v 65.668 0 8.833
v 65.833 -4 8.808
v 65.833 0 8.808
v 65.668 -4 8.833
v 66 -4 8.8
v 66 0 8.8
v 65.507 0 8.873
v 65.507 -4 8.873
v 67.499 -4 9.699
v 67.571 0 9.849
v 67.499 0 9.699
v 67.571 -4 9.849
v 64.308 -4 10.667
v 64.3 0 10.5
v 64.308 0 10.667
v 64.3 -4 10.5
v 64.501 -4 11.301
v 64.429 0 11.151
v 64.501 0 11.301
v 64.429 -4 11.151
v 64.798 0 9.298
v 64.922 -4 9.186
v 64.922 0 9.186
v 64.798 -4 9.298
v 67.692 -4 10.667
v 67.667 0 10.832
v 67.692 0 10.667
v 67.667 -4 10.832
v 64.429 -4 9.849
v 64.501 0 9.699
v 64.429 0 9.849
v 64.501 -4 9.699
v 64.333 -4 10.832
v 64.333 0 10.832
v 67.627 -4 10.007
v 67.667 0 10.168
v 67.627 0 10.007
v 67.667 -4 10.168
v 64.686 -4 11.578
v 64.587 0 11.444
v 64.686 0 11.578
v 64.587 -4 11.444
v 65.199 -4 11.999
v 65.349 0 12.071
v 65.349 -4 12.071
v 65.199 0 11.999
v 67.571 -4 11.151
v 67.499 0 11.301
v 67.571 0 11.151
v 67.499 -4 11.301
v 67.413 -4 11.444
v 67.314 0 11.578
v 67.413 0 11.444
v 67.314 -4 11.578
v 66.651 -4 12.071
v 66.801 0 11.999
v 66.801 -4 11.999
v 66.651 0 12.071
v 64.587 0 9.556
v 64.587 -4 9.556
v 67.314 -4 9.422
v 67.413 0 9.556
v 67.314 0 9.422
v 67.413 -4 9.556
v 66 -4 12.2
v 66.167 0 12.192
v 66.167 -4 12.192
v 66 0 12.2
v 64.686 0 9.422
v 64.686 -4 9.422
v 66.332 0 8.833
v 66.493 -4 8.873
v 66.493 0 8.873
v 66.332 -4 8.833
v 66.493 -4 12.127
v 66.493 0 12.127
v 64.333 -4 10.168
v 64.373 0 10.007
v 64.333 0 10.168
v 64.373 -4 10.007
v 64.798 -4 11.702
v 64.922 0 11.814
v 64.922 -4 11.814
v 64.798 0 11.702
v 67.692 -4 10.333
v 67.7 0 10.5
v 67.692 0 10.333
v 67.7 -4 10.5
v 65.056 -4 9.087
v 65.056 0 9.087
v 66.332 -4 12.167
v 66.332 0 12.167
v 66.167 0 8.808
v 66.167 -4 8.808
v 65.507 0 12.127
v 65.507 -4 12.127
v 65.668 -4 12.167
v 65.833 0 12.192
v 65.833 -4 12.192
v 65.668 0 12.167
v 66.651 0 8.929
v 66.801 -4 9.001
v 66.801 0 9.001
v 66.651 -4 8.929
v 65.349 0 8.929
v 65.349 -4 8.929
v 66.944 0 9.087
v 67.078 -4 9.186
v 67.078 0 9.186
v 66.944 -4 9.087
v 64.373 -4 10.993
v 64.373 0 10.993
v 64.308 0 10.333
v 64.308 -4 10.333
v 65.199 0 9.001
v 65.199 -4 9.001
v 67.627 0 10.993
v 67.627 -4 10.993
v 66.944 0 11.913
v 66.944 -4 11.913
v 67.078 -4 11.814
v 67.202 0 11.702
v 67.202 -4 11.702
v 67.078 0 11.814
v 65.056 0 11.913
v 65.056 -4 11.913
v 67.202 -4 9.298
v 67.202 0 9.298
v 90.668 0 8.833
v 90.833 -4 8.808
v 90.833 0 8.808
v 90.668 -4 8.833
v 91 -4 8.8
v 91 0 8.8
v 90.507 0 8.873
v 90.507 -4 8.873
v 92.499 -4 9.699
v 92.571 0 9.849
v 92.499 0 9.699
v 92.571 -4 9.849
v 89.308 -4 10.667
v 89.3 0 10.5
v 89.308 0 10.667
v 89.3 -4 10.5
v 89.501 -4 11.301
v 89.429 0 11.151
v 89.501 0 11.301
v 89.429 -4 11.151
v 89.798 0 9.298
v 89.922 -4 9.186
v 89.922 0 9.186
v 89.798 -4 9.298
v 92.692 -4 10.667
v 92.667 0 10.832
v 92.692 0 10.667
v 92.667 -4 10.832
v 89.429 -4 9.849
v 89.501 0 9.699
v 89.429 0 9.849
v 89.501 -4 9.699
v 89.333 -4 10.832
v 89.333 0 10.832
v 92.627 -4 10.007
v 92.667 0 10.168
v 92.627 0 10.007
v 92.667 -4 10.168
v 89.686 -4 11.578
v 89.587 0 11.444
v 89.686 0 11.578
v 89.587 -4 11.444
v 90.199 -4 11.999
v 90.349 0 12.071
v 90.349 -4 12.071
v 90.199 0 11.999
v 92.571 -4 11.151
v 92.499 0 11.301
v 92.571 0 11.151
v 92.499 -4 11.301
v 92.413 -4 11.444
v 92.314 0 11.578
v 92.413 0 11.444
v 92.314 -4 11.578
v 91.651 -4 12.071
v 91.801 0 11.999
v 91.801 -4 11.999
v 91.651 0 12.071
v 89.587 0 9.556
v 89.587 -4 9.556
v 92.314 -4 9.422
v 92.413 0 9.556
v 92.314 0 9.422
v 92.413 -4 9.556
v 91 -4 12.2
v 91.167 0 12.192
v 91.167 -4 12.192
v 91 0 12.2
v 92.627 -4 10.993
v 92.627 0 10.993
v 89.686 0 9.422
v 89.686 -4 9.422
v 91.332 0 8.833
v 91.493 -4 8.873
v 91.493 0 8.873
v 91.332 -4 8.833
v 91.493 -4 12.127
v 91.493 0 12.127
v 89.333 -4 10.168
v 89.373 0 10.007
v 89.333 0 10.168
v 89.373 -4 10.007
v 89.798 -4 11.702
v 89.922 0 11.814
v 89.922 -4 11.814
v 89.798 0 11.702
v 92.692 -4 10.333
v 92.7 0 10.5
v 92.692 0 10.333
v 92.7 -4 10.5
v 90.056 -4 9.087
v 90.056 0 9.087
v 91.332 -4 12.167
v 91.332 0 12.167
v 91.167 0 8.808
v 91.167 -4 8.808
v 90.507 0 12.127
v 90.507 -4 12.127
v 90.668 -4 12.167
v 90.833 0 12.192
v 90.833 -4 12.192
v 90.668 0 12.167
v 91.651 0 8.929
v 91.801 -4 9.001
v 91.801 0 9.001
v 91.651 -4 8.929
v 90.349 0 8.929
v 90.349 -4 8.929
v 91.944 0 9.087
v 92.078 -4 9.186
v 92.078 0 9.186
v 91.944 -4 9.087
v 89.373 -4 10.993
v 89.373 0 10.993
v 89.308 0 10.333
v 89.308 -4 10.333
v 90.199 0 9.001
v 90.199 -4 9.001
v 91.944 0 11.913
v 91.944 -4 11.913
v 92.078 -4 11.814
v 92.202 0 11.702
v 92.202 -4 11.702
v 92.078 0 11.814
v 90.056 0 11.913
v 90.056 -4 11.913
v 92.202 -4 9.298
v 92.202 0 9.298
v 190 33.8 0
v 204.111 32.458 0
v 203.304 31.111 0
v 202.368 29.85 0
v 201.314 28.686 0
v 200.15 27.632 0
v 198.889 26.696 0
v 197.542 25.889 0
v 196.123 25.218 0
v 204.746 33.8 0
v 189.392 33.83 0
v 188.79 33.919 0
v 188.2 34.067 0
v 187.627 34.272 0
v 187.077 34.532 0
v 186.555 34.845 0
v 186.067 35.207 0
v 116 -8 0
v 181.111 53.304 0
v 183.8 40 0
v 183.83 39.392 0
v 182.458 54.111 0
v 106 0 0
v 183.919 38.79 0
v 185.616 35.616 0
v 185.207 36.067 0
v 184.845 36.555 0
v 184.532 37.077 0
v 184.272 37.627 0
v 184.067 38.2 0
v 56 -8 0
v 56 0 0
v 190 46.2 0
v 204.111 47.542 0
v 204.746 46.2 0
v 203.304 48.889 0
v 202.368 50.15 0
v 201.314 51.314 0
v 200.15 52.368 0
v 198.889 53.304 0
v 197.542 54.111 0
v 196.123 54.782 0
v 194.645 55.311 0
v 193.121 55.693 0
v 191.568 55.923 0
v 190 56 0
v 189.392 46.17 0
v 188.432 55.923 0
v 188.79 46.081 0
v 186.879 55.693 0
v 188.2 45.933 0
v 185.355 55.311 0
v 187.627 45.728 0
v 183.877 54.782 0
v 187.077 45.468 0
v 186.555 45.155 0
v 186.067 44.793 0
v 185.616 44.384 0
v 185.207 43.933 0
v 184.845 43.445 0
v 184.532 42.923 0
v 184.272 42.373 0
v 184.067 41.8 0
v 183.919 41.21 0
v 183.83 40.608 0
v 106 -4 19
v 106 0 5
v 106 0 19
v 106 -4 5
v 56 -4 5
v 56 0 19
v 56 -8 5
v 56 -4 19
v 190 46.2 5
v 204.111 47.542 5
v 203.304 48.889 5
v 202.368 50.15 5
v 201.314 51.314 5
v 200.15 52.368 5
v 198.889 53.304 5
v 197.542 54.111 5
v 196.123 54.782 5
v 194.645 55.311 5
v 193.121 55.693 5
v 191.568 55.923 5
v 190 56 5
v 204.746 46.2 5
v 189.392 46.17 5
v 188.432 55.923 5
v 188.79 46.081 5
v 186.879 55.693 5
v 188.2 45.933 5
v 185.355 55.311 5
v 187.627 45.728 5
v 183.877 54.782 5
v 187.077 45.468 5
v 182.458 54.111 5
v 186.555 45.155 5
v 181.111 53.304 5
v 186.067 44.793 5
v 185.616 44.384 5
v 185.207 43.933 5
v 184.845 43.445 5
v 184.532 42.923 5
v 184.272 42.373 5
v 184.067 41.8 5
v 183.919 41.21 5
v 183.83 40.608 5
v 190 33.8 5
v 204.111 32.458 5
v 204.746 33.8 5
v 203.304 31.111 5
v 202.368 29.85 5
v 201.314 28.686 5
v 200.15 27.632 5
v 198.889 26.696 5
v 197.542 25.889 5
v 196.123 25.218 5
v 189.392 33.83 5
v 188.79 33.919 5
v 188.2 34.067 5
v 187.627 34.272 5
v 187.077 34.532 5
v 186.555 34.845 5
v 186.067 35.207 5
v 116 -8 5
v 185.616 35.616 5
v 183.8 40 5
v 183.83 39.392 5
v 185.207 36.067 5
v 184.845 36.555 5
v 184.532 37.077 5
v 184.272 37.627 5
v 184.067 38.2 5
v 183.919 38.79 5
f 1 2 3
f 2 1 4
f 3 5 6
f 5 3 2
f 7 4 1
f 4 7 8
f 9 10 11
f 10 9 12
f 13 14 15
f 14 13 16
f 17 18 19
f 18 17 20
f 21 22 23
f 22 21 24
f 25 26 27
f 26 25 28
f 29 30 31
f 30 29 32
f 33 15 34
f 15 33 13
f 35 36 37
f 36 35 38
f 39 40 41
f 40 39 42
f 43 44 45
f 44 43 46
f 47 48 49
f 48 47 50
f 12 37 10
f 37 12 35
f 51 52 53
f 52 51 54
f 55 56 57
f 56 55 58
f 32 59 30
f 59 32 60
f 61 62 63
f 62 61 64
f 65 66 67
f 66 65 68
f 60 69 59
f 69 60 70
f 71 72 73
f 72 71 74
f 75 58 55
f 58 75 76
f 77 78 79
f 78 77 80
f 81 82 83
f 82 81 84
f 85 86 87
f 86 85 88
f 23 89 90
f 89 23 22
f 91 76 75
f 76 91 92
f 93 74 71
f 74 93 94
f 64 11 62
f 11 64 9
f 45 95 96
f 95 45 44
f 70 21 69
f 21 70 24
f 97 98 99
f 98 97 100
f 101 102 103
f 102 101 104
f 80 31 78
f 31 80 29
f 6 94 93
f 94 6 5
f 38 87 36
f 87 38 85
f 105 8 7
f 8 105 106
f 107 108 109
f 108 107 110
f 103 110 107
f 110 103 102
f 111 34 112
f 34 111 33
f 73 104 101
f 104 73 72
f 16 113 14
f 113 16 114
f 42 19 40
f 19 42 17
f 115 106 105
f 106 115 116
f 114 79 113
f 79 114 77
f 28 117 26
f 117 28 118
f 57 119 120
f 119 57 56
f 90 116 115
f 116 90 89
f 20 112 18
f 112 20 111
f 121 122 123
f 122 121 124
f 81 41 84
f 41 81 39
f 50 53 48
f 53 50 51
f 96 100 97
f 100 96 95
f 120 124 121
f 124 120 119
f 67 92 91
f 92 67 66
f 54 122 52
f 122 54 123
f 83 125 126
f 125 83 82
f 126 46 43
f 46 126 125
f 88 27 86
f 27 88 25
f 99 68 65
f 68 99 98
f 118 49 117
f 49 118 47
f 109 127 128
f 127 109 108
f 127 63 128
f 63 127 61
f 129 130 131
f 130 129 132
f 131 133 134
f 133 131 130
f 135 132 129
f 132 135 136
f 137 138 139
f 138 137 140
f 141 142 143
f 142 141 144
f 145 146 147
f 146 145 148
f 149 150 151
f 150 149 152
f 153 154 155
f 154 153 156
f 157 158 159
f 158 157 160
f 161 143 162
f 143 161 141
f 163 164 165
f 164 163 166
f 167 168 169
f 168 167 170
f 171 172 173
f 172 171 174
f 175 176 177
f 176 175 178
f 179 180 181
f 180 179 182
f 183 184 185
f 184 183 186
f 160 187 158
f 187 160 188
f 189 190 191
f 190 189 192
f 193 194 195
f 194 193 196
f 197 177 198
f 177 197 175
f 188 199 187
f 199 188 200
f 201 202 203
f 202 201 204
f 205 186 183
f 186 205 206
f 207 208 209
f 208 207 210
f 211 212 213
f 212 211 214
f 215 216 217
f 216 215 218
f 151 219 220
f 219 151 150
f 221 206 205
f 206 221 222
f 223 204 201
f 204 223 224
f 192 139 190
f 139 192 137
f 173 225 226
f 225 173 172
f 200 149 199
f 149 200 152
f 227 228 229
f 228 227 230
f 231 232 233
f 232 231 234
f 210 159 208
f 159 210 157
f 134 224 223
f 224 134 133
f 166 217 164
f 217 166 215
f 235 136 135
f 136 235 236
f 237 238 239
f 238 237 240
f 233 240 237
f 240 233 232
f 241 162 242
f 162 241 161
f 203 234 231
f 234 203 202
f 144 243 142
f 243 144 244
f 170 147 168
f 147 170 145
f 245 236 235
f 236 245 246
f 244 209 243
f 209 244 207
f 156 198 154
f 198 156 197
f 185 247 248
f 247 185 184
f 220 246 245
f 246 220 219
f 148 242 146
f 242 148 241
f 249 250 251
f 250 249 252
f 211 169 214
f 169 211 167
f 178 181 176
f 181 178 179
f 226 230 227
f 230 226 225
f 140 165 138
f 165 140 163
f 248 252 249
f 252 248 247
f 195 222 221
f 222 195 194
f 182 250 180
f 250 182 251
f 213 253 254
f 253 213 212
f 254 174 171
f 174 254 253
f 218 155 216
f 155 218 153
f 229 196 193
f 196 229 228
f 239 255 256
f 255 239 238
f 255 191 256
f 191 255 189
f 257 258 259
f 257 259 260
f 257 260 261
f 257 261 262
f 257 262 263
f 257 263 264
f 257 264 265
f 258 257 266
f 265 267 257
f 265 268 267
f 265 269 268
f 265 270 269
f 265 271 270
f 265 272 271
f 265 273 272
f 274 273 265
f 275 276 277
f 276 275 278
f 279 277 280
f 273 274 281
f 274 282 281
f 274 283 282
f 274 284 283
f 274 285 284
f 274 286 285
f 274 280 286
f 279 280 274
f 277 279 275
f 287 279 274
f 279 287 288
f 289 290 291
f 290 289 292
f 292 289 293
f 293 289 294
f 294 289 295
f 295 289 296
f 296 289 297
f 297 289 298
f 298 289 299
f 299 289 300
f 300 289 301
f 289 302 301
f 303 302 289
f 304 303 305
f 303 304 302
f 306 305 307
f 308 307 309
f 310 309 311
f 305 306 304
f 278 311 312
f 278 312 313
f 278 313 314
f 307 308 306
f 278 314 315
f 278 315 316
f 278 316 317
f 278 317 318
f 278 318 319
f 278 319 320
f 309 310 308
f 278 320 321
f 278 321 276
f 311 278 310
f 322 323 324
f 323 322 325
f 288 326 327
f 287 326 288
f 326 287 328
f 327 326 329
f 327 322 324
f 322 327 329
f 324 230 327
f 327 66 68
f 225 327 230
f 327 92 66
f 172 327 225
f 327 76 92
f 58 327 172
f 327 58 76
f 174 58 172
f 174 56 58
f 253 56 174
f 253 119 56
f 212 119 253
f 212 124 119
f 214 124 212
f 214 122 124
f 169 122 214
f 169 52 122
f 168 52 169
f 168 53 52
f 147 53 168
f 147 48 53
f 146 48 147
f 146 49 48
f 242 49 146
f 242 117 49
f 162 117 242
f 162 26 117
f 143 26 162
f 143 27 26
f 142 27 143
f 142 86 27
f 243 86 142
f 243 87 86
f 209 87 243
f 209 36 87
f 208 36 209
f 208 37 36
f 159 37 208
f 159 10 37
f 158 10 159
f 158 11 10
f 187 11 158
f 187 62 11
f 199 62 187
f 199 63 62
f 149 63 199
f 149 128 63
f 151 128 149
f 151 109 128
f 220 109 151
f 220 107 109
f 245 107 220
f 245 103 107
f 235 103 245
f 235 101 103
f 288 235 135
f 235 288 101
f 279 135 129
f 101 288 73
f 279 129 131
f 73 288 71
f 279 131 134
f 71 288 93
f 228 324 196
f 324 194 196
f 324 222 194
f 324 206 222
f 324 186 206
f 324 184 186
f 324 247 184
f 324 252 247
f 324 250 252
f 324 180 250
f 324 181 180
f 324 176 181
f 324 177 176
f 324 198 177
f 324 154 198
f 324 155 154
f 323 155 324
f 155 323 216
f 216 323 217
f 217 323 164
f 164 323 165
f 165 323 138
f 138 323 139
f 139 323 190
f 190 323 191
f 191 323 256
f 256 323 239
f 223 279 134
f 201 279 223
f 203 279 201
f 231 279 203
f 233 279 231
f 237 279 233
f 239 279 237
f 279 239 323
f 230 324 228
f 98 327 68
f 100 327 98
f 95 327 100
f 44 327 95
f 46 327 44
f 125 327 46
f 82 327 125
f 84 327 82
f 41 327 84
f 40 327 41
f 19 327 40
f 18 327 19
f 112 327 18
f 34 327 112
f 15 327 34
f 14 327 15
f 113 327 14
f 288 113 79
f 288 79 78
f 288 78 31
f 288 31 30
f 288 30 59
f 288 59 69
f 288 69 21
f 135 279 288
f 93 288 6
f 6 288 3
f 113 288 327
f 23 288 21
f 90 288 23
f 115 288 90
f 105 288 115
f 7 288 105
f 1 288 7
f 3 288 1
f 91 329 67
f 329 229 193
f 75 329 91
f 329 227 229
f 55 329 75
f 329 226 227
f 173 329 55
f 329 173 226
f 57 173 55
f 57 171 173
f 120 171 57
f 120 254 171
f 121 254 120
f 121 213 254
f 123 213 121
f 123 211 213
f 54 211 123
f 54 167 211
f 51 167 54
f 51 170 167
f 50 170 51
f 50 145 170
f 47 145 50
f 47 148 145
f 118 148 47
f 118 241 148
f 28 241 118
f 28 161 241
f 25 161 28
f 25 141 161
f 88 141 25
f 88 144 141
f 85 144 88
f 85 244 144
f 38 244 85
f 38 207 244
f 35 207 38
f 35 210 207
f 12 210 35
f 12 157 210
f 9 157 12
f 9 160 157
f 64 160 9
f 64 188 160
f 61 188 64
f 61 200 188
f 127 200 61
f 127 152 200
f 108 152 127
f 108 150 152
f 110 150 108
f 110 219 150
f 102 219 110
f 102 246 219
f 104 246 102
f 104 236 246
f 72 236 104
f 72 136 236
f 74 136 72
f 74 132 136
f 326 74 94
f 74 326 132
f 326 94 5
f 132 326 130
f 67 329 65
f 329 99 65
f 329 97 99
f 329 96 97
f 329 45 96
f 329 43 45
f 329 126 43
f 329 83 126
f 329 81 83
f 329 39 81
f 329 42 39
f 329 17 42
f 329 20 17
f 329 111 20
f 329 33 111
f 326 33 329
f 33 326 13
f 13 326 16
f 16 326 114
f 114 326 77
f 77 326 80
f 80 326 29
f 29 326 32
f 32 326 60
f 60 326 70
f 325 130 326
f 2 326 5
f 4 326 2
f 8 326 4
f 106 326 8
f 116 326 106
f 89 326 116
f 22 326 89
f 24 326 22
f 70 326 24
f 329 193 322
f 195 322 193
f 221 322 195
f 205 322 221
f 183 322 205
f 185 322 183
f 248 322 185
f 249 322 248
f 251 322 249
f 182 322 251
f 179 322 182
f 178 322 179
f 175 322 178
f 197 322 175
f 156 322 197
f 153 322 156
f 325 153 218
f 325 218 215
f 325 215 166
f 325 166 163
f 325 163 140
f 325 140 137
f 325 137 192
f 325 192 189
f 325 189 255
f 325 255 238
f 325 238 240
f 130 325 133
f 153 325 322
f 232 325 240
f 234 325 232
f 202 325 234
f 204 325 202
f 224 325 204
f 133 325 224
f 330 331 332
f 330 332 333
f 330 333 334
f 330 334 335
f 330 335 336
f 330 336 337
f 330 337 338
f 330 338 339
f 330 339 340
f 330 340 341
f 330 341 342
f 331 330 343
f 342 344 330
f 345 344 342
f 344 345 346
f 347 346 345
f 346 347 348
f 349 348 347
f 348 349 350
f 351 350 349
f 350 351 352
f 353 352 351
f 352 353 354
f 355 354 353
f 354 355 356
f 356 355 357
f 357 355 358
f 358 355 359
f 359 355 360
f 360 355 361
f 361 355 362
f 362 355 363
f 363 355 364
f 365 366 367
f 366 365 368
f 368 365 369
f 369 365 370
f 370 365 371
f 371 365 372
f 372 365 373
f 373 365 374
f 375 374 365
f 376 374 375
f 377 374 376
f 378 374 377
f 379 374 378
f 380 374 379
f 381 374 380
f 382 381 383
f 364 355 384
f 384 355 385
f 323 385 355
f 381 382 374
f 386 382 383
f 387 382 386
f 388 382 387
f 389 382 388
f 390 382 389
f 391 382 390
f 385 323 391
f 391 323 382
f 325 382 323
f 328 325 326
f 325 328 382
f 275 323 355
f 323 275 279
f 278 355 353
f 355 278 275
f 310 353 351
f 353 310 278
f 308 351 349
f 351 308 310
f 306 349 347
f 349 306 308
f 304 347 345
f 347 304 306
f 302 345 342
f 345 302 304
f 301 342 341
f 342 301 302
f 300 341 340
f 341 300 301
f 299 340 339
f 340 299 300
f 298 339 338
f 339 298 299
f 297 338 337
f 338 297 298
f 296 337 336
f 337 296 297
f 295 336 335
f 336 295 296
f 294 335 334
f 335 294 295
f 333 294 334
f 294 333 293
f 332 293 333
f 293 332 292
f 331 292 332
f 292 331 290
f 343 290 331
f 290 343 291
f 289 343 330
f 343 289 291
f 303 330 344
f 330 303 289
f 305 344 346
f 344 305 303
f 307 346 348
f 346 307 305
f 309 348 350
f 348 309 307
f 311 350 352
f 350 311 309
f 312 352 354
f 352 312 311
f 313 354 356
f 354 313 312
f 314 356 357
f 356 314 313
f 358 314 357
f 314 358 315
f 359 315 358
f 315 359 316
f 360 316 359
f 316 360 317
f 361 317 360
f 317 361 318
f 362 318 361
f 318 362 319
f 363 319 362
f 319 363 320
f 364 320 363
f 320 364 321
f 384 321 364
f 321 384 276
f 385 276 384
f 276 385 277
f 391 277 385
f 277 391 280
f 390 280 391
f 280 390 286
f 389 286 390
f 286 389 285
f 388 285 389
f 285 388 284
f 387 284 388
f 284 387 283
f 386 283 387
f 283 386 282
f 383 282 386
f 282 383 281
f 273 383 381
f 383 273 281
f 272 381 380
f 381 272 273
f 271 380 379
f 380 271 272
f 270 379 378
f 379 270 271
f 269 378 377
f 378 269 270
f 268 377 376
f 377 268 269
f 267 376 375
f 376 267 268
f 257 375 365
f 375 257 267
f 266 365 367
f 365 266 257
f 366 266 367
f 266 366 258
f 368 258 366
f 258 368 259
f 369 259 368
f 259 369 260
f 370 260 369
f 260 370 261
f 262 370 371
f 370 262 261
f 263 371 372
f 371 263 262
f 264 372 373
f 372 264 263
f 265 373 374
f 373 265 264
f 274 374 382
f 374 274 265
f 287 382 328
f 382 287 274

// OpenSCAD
// Roll arm (print one left, one right). Bolts to the outside of the back wall
// with two M3 x 10 + nuts and holds a roll axle in an open-top hook, so the
// roll lifts straight out, as on the Openprinter's roll bracket.
//
//   -D 'side="left"' or -D 'side="right"'
//
// Print flat (the big plate on the bed, tab up), no supports.

include <common.scad>

side = "left";
dir  = side == "left" ? -1 : 1;     // tab points away from the paper

strip_y = 8;                         // part of the arm behind the back wall
hook_r  = 16;
slot_w  = 12.4;                      // roll_axle journal is 12

// Arm outline in (Y, Z) frame coordinates.
module arm_profile() {
    difference() {
        union() {
            translate([-strip_y, height - 50]) square([strip_y, 60]);
            hull() {
                translate([-strip_y, height]) square([strip_y, 10]);
                translate([roll_y, roll_z]) circle(r = hook_r);
            }
        }
        // open-top slot for the axle journal
        translate([roll_y, roll_z]) circle(d = slot_w);
        translate([roll_y - slot_w / 2, roll_z]) square([slot_w, hook_r + 1]);
    }
}

module arm(dir) {
    // plate, thickness along X
    rotate([90, 0, 90]) linear_extrude(arm_t) arm_profile();
    // tab against the back wall, with the two M3 holes
    difference() {
        translate([dir < 0 ? -14 : 0, -back_t, height - 50])
            cube([arm_t + 14, back_t, 50]);
        for (z = [height - 40, height - 15])
            translate([arm_t / 2 + dir * 8, -back_t - 1, z])
                rotate([-90, 0, 0]) cylinder(d = m3, h = back_t + 2);
    }
}

module arm_left()  arm(-1);   // frame coordinates, origin at arm_x
module arm_right() arm(1);

// lay the plate on the bed with the tab pointing up
if (dir < 0) translate([0, 0, arm_t]) rotate([0, 90, 0]) arm(dir);
else rotate([0, -90, 0]) arm(dir);
